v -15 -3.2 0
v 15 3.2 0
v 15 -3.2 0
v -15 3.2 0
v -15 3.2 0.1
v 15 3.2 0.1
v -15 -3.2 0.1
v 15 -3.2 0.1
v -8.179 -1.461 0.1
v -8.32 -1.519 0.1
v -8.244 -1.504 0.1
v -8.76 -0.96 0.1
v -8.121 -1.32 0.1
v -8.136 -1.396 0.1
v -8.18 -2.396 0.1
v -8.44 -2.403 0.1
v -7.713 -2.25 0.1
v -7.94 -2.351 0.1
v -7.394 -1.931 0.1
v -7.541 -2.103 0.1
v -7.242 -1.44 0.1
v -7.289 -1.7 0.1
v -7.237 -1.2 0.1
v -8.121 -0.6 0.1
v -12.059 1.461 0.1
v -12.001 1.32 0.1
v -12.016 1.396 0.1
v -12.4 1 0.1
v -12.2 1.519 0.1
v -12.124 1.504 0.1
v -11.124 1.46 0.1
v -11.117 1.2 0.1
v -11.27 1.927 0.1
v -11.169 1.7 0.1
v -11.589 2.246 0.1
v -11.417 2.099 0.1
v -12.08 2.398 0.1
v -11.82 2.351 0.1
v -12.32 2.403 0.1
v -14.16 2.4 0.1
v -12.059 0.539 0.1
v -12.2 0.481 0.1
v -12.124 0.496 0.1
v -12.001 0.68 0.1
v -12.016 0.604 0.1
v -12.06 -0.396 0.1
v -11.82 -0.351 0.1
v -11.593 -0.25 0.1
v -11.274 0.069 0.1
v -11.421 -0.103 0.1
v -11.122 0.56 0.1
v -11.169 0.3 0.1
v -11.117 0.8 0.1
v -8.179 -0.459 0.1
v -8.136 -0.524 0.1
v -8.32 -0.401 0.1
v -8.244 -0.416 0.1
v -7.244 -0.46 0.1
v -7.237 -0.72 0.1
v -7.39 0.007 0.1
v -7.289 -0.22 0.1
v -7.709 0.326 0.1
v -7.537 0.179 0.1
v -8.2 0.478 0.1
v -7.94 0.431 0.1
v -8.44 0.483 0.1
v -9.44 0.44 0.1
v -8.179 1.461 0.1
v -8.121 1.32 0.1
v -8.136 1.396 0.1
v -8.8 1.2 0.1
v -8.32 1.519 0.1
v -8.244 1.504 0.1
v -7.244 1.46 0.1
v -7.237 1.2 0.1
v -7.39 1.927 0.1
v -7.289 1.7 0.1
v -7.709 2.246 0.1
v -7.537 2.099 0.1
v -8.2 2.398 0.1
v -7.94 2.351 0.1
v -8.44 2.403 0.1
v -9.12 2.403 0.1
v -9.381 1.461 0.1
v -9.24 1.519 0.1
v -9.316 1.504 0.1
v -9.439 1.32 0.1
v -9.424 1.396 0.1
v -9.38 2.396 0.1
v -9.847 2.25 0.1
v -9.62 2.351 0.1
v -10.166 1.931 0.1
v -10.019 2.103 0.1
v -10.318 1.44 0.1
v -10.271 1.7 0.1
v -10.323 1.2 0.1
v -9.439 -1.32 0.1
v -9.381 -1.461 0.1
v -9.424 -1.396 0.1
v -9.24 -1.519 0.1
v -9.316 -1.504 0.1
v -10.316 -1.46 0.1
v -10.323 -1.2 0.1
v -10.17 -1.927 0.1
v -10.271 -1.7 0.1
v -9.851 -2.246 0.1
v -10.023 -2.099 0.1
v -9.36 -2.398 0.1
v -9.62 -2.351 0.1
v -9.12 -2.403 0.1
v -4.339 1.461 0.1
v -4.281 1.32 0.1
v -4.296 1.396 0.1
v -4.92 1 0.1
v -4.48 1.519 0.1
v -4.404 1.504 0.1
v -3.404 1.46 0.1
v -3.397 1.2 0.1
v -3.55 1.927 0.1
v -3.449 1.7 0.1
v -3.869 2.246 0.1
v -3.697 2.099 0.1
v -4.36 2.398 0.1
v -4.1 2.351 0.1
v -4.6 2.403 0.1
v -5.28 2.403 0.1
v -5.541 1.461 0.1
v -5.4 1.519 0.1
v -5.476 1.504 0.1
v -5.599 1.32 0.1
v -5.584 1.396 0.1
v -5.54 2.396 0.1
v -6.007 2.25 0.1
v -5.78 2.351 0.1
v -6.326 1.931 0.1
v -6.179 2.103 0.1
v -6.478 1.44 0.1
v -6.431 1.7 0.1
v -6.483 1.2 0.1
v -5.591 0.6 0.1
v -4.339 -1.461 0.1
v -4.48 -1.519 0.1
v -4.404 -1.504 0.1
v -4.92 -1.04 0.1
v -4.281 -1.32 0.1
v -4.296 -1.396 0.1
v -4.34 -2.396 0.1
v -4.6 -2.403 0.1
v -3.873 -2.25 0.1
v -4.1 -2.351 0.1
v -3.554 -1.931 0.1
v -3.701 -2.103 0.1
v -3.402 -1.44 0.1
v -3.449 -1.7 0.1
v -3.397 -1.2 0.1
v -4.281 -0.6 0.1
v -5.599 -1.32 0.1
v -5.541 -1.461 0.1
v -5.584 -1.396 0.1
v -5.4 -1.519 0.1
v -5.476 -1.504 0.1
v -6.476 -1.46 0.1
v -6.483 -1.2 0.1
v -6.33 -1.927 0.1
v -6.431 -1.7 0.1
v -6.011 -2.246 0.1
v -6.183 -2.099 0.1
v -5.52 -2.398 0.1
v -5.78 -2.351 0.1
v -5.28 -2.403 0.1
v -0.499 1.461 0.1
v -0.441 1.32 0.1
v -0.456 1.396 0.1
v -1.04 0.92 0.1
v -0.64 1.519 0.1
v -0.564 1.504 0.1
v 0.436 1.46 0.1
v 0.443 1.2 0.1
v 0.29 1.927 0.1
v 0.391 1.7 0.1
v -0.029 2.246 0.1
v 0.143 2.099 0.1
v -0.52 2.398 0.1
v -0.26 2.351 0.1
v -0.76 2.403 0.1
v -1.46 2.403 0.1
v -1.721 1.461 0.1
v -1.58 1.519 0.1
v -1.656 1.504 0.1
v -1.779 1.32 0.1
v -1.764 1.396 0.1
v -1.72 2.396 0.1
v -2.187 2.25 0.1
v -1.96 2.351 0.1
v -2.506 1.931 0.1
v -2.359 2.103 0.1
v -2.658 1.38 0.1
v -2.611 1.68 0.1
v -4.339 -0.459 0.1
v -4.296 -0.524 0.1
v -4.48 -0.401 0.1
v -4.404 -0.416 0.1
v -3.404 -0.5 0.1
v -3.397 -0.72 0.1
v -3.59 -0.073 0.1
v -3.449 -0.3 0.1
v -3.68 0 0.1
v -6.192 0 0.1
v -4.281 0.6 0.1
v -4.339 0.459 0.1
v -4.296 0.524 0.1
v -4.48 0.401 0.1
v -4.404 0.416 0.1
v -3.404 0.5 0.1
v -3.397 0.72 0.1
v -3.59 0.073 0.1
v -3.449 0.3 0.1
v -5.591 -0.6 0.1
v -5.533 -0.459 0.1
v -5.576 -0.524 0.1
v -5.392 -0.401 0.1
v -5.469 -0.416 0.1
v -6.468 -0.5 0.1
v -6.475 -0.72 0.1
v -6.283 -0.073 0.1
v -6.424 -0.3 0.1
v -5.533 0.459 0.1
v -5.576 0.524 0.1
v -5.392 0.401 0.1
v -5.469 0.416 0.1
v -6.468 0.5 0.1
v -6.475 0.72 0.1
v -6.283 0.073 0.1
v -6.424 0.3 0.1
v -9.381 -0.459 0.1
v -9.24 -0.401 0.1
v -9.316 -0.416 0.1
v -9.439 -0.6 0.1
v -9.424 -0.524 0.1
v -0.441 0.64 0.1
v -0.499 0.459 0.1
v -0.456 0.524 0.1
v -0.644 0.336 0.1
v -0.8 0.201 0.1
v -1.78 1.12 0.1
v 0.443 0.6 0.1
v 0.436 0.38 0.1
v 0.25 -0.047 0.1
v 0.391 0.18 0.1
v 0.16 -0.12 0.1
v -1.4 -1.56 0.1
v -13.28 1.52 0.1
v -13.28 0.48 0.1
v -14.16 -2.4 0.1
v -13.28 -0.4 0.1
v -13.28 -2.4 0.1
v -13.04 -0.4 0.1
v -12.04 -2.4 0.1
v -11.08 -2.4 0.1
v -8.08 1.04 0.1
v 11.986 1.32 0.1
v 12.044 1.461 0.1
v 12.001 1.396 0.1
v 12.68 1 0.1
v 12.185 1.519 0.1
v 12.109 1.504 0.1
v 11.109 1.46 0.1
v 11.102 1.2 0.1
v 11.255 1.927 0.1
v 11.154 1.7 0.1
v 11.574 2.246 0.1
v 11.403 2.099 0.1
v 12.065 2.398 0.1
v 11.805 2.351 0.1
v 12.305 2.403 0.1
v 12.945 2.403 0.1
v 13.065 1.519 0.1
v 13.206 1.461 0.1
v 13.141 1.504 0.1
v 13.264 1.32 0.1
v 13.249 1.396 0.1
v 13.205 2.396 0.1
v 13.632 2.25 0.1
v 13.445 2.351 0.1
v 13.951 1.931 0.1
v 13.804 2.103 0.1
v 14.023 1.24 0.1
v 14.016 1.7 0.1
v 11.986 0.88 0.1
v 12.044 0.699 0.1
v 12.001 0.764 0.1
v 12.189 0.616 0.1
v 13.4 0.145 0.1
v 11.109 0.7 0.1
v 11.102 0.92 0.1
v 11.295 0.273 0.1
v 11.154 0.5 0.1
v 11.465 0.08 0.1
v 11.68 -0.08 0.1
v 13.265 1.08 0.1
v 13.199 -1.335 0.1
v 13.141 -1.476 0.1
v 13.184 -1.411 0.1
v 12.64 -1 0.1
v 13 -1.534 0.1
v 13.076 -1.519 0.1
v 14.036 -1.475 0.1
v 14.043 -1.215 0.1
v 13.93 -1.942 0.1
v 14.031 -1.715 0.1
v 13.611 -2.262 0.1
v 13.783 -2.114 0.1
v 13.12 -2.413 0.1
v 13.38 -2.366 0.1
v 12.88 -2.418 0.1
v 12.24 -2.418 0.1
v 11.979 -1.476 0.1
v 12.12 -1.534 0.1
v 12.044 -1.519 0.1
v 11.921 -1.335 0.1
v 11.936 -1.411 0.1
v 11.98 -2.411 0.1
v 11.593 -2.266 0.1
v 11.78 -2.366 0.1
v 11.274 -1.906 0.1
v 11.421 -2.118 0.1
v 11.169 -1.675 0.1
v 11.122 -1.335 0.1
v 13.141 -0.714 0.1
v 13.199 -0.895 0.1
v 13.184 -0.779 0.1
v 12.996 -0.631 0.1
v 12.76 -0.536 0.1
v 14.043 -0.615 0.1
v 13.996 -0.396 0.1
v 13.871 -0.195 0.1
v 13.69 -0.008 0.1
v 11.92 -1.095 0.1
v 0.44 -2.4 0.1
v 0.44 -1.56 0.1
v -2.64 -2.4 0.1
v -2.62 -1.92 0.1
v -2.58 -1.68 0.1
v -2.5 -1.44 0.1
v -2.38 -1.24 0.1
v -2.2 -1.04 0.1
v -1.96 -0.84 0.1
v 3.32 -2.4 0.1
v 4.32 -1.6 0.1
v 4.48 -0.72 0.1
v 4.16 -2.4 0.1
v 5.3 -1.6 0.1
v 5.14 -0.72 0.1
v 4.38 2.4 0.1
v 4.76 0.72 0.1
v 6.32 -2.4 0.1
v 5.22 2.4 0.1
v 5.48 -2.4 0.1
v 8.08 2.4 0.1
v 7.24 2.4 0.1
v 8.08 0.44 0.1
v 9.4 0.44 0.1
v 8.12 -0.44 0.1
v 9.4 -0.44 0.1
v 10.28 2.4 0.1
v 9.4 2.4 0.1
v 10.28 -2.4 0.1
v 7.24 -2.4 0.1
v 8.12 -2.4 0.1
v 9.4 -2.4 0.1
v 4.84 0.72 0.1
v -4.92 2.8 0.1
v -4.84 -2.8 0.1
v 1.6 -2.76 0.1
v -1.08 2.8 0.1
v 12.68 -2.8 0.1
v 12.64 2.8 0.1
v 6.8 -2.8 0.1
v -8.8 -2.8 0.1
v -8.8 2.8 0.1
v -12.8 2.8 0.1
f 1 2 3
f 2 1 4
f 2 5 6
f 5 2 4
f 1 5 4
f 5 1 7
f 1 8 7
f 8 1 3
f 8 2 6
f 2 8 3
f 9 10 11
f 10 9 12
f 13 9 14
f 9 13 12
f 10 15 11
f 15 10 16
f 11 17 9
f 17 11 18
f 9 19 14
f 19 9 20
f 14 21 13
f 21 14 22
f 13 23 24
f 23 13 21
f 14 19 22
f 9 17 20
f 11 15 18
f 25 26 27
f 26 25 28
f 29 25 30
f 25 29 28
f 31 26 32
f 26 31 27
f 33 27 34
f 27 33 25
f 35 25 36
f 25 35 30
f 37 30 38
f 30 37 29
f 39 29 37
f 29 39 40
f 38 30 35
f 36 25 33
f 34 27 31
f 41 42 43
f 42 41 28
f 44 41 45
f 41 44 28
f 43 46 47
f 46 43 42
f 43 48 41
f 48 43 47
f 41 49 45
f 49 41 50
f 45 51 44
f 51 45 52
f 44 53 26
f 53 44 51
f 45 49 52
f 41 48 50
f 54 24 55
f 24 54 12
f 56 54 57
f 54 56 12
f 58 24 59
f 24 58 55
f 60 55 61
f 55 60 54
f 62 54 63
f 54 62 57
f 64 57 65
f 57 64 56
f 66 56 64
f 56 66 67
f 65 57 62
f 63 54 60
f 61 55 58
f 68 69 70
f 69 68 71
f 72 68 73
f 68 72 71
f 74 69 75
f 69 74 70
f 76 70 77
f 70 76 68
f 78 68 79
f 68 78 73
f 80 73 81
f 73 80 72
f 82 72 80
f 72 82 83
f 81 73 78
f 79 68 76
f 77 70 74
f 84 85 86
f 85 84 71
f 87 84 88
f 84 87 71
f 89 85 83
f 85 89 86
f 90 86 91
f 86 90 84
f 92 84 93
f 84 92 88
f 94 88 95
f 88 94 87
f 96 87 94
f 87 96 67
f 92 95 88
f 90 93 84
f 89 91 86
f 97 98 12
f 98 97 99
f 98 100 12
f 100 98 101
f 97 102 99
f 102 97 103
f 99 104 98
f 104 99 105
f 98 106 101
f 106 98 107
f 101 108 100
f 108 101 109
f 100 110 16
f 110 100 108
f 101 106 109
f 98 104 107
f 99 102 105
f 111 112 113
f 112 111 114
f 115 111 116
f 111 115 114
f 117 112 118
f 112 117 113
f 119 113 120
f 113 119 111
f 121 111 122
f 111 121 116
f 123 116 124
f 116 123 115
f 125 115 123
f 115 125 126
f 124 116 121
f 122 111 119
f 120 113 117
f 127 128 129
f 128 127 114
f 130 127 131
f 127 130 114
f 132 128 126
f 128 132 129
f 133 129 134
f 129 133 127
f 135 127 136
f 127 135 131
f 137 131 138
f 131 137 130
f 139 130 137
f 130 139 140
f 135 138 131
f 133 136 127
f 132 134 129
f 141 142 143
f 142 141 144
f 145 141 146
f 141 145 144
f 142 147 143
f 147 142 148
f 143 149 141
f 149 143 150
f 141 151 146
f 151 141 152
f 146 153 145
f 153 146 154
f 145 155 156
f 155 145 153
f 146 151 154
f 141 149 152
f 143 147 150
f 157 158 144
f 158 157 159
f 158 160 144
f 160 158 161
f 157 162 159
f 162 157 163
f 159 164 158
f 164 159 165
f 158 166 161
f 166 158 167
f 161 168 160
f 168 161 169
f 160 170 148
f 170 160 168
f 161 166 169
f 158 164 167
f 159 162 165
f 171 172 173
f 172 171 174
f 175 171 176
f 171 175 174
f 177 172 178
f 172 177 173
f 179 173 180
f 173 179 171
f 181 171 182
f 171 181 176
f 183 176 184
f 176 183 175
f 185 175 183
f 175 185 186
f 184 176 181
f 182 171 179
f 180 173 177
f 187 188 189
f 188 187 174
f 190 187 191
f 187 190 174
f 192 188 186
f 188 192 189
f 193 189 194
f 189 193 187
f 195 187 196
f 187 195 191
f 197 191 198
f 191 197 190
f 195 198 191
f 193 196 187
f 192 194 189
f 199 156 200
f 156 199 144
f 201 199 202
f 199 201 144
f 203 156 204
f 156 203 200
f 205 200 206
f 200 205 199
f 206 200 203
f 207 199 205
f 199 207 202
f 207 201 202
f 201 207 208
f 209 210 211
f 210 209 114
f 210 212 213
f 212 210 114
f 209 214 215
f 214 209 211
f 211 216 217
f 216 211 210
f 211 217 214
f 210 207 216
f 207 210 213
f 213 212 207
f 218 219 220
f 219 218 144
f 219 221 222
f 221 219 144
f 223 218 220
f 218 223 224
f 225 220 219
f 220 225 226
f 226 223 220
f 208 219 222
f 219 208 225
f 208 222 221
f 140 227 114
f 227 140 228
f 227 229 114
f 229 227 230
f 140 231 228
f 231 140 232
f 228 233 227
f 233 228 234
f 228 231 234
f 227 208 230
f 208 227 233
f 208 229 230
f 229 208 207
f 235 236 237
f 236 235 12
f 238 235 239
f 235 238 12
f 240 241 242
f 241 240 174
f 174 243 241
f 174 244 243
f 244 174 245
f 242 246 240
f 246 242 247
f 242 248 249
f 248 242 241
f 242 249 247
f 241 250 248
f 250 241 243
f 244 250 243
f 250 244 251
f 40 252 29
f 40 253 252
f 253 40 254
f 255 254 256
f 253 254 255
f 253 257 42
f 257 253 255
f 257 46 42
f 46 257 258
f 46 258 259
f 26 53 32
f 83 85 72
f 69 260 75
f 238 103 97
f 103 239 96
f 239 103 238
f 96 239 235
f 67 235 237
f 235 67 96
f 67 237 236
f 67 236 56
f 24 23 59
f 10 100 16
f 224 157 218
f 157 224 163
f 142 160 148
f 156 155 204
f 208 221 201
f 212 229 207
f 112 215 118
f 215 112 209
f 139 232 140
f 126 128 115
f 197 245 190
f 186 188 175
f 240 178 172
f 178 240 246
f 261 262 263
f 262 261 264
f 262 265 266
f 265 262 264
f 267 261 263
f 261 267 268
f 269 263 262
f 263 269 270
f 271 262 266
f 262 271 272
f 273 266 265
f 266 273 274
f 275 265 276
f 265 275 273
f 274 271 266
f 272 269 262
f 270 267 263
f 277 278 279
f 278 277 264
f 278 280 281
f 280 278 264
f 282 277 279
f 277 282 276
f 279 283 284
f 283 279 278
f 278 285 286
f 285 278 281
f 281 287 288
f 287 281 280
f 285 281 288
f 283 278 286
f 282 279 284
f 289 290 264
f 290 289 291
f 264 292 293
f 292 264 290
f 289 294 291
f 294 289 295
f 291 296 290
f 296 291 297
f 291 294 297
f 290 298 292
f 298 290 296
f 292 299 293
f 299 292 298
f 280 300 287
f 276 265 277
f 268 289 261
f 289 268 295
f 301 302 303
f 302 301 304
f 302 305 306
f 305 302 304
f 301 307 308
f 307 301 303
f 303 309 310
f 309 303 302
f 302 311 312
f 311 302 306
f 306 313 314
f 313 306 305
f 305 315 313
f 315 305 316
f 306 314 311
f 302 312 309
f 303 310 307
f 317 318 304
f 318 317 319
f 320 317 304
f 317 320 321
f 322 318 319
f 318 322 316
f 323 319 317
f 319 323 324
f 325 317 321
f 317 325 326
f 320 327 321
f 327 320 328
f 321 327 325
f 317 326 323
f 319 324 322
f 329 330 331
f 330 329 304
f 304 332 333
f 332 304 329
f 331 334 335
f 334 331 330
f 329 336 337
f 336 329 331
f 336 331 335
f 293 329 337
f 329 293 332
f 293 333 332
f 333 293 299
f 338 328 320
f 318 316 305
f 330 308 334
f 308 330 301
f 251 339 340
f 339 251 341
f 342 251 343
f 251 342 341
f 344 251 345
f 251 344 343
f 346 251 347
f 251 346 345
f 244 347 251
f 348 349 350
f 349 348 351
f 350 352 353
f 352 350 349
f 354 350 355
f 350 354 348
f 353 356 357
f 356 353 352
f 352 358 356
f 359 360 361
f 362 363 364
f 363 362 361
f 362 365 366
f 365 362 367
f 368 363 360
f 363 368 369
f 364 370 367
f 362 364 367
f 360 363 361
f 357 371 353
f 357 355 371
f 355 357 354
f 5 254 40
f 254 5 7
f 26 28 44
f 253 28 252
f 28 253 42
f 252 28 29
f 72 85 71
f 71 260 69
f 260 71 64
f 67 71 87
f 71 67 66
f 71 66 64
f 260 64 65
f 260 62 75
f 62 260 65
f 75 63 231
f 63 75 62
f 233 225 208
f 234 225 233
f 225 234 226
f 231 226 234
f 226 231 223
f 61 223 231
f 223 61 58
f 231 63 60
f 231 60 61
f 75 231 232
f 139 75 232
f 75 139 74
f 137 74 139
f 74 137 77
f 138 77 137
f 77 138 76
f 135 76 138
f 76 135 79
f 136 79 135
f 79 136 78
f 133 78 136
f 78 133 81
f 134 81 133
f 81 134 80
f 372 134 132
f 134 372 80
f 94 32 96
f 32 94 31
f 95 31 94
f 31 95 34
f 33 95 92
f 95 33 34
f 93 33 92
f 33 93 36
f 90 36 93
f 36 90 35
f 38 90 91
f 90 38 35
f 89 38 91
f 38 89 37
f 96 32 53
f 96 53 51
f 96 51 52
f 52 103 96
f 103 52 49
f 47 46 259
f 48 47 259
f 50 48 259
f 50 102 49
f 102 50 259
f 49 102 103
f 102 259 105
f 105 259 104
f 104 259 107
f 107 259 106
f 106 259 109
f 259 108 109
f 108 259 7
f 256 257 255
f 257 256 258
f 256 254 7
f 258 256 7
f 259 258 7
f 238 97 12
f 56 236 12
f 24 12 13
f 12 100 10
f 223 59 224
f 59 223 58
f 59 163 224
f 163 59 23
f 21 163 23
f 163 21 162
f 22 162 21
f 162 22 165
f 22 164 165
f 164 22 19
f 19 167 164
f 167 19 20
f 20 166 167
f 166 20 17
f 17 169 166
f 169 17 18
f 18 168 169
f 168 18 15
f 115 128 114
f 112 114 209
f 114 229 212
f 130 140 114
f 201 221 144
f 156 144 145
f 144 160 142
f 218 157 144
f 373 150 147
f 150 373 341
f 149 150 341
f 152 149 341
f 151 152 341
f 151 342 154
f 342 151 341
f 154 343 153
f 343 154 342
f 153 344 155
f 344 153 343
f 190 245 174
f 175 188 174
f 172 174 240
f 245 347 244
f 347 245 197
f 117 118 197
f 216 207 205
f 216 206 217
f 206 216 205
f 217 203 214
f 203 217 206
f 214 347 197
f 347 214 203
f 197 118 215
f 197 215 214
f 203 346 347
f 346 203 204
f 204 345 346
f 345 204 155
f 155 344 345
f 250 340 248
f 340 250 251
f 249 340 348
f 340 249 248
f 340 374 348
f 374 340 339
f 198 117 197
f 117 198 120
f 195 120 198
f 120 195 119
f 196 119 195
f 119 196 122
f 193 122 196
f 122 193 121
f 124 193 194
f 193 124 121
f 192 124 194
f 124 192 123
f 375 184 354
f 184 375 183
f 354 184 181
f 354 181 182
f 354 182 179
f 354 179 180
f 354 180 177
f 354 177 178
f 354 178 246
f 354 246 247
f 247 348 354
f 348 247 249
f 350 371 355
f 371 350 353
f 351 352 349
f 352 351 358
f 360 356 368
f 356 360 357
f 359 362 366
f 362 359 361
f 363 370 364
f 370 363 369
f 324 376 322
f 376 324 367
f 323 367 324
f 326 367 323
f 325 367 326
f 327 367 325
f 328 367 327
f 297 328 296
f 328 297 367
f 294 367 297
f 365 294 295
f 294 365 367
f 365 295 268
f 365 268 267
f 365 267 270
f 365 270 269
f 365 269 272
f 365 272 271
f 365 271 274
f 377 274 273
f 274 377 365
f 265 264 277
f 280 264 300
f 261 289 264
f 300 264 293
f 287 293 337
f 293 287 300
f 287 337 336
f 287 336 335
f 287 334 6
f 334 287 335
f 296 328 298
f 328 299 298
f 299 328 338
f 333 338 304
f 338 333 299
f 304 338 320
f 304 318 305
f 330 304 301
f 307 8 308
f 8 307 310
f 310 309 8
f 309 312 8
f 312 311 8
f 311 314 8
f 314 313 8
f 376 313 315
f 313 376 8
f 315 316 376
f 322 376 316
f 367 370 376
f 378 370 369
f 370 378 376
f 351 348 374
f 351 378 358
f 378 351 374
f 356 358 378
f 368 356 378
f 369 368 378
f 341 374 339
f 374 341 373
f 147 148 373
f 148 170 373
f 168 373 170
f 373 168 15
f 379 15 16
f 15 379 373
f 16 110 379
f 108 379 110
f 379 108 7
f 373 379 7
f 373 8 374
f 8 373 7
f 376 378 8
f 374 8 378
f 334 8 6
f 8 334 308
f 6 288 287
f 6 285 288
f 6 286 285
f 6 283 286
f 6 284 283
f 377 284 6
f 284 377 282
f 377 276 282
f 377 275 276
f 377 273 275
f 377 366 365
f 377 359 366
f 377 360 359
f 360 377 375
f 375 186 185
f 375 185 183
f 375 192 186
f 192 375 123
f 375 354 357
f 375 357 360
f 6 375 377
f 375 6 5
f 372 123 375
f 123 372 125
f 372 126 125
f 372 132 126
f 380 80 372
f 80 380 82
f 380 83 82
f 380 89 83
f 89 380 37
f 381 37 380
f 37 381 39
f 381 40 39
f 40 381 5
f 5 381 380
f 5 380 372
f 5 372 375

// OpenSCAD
use <../lib.scad>
use <../p/box5-12.scad>
use <s/6062886cs01.scad>
$fa=1; $fs=0.2;
function ldraw_lib__6062886c(realsolid=false) = [
// 0 Sticker  0.8 x  3.7 with "R682 AHS" on Yellow Background
// 0 Name: 6062886c.dat
// 0 Author: Magnus Forsberg [MagFors]
// 0 !LDRAW_ORG Part UPDATE 2019-03
// 0 !LICENSE Licensed under CC BY 2.0 and CC BY 4.0 : see CAreadme.txt
// 
// 0 BFC CERTIFY CCW
  [0,"BFC","CERTIFY"],
  [0,"BFC","CCW"],
// 
// 0 !KEYWORDS Cooper, Mini, Mini Cooper MK VII, set 10242
// 
// 0 !HISTORY 2019-12-27 [PTadmin] Official Update 2019-03
// 
// 
// 1 16 0 -0.25 0 37.5 0 0 0 0.25 0 0 0 8 box5-12.dat
  [1,16,0,-0.25,0,37.5,0,0,0,0.25,0,0,0,8, ldraw_lib__box5_12(realsolid)],
// 1 14 0 0 0 1 0 0 0 1 0 0 0 1 s\6062886cs01.dat
  [1,14,0,0,0,1,0,0,0,1,0,0,0,1, ldraw_lib__s__6062886cs01(realsolid)],
];
module ldraw_lib__6062886c(step=0, col=false, unit=2/5, alt=false, line=0.2, solid=!$preview)
    makepoly(ldraw_lib__6062886c(solid), step=step, col=col, unit=unit, alt=alt, line=line, solid=solid);
ldraw_lib__6062886c(line=0.2);
